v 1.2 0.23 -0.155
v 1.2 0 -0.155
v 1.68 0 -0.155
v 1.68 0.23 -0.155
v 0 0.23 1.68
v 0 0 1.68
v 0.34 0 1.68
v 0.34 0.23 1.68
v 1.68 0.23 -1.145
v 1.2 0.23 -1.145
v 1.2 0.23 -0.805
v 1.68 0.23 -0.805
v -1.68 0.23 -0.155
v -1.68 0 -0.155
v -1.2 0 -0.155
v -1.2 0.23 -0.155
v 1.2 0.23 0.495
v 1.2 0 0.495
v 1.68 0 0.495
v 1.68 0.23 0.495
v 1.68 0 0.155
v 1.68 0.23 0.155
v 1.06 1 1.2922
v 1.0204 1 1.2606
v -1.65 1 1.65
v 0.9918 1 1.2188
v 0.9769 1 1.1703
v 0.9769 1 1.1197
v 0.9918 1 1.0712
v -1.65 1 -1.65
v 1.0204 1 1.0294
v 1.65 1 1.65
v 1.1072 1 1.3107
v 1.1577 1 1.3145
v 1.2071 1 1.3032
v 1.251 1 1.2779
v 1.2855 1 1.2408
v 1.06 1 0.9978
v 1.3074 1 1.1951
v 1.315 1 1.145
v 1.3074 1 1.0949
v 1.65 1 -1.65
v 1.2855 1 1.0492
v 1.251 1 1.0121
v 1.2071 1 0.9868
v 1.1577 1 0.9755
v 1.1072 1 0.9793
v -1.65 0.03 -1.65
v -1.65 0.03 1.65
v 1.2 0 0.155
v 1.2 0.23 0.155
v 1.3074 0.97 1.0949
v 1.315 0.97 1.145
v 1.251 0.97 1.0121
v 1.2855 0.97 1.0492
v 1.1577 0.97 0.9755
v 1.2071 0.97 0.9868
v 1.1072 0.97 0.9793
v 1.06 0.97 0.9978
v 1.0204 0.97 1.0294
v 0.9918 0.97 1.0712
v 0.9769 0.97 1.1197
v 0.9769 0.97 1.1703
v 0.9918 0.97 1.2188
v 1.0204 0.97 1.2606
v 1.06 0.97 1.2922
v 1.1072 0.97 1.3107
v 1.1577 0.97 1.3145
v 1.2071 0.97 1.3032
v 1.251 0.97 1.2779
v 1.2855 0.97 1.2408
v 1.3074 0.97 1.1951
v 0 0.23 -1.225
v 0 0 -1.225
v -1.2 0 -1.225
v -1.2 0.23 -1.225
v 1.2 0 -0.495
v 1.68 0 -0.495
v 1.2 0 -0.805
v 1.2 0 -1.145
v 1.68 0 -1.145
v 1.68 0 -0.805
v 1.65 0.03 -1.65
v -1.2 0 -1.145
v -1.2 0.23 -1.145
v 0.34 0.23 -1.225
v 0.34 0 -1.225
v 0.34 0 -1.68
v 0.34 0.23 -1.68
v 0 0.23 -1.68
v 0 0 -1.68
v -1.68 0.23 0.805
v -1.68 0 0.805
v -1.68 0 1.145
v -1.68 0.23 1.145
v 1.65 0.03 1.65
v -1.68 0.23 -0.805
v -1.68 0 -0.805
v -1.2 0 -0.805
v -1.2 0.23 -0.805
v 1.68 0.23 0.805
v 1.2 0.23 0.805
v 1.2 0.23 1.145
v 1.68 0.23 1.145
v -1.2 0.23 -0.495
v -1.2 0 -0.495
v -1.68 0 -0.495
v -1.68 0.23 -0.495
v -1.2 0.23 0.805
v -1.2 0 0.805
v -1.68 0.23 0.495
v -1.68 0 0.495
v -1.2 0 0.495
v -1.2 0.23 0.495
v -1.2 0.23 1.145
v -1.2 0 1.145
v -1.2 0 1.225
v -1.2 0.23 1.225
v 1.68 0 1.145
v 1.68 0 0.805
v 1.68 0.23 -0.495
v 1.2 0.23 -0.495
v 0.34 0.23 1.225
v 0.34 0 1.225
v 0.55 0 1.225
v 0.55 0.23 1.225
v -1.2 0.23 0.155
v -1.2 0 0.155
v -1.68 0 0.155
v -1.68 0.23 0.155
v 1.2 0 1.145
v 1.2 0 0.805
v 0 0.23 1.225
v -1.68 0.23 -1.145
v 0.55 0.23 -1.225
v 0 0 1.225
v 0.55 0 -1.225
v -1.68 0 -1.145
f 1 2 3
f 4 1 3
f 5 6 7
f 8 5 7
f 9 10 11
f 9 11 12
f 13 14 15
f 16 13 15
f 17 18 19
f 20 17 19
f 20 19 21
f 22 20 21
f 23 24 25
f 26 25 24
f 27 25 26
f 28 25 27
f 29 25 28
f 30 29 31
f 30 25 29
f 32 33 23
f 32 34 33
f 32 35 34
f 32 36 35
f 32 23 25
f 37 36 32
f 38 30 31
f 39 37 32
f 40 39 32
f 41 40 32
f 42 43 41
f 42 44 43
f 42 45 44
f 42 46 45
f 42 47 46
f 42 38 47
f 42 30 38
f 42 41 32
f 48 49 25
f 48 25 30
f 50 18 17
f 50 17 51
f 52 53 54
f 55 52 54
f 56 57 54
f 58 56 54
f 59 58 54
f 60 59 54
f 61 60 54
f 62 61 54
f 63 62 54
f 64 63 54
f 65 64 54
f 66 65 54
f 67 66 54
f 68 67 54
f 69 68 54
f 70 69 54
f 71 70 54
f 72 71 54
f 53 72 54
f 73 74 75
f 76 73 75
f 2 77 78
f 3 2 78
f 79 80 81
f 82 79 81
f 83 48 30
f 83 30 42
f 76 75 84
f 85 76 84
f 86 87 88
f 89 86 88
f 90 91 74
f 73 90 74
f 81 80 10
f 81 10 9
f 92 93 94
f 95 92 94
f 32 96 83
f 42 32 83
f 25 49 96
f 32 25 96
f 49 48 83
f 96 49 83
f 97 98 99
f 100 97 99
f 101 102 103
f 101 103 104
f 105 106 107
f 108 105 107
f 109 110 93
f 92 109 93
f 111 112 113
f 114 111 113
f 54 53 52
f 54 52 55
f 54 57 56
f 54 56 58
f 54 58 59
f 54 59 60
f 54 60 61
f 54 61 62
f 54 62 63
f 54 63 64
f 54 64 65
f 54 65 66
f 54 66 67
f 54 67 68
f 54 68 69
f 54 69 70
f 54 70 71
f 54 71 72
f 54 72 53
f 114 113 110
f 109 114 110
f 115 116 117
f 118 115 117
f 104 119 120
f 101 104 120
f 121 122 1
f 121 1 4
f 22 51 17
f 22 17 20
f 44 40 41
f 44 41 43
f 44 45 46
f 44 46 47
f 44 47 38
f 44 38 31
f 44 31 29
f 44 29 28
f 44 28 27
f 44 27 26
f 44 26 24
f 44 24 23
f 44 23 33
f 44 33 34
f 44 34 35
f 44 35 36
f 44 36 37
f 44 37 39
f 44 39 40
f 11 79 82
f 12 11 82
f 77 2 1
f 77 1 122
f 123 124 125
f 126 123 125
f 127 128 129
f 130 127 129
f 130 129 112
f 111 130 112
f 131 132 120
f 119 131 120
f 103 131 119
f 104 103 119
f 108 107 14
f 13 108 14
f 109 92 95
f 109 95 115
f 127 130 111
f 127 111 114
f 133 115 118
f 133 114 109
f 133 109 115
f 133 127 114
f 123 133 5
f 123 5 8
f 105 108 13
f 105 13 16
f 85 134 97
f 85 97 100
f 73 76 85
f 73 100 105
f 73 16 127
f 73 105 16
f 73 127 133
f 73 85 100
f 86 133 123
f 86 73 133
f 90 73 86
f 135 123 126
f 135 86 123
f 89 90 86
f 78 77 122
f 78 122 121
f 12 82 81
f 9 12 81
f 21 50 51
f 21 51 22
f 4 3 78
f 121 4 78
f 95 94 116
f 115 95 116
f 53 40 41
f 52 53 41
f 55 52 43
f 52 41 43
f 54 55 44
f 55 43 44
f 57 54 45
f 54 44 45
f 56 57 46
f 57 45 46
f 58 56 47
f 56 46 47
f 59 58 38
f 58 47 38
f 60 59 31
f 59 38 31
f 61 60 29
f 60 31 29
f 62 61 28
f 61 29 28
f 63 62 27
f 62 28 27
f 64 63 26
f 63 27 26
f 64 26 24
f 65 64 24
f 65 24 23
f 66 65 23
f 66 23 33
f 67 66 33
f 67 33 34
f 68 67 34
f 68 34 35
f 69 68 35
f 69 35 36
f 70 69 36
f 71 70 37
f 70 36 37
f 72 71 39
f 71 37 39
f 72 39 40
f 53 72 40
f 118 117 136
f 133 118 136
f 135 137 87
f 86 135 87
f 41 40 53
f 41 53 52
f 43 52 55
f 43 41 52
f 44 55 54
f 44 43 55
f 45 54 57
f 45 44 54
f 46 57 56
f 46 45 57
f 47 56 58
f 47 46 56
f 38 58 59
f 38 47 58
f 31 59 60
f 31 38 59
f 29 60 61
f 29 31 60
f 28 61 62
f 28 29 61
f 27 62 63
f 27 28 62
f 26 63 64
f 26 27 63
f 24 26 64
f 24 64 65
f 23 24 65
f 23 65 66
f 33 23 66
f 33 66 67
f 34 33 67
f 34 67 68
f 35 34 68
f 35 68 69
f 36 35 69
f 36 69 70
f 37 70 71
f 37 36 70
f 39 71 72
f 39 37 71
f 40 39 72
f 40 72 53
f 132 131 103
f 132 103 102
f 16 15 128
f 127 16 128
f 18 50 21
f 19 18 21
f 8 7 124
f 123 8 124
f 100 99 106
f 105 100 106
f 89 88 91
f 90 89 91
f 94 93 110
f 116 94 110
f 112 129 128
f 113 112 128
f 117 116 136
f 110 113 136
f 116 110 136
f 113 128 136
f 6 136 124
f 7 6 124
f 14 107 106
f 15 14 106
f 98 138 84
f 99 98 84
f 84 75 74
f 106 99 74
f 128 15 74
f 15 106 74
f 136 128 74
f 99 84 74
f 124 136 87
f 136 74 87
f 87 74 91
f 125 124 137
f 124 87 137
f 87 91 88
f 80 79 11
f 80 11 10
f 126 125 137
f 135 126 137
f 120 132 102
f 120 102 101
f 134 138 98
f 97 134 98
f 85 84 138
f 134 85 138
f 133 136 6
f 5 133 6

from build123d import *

# Parameters (mm, degrees)
EXTRUDE_START       = 0.03
SKETCH_1_W          = 3.3
SKETCH_1_H          = 3.3
EXTRUDE_1_DEPTH     = 0.97
SKETCH_2_W          = 0.48
SKETCH_2_H          = 0.34
EXTRUDE_2_DEPTH     = 0.23
EXTRUDE_2_2_DEPTH   = 0.23
EXTRUDE_2_3_DEPTH   = 0.23
EXTRUDE_2_4_DEPTH   = 0.23
EXTRUDE_3_DEPTH     = 0.23
CUT_EXTRUDE_START   = 1
SKETCH_4_R          = 0.17
CUT_EXTRUDE_1_DEPTH = 0.03
EXTRUDE_START_2     = 1
SKETCH_4_2_R        = 0.17
EXTRUDE_4_DEPTH     = 0.03


with BuildPart() as part:
    # Эскиз1 → Бобышка-Вытянуть1 (new body)
    with BuildSketch(Plane(origin=(0, 0, 0), x_dir=(1, 0, 0), z_dir=(0, 1, 0)).offset(EXTRUDE_START)):
        Rectangle(SKETCH_1_W, SKETCH_1_H)
    extrude(amount=EXTRUDE_1_DEPTH)

    # Эскиз4 → Вырез-Вытянуть1 (cut)
    with BuildSketch(Plane(origin=(0, 0, 0), x_dir=(1, 0, 0), z_dir=(0, 1, 0)).offset(CUT_EXTRUDE_START)):
        with Locations((1.145, -1.145)):
            Circle(SKETCH_4_R)
    extrude(amount=-CUT_EXTRUDE_1_DEPTH, mode=Mode.SUBTRACT)


with BuildPart() as body_2:
    # Эскиз2 → Бобышка-Вытянуть2 (new body)
    with BuildSketch(Plane(origin=(0, 0, 0), x_dir=(1, 0, 0), z_dir=(0, 1, 0))):
        with Locations((1.44, -0.975)):
            Rectangle(SKETCH_2_W, SKETCH_2_H)
    extrude(amount=EXTRUDE_2_DEPTH)


with BuildPart() as body_3:
    # Эскиз2 → Extrude 2 2 (new body)
    with BuildSketch(Plane(origin=(0, 0, 0), x_dir=(1, 0, 0), z_dir=(0, 1, 0))):
        with Locations((1.44, 0.325)):
            Rectangle(SKETCH_2_W, SKETCH_2_H)
    extrude(amount=EXTRUDE_2_2_DEPTH)


with BuildPart() as body_4:
    # Эскиз2 → Extrude 2 3 (new body)
    with BuildSketch(Plane(origin=(0, 0, 0), x_dir=(1, 0, 0), z_dir=(0, 1, 0))):
        with Locations((1.44, 0.975)):
            Rectangle(SKETCH_2_W, SKETCH_2_H)
    extrude(amount=EXTRUDE_2_3_DEPTH)


with BuildPart() as body_5:
    # Эскиз2 → Extrude 2 4 (new body)
    with BuildSketch(Plane(origin=(0, 0, 0), x_dir=(1, 0, 0), z_dir=(0, 1, 0))):
        with Locations((1.44, -0.325)):
            Rectangle(SKETCH_2_W, SKETCH_2_H)
    extrude(amount=EXTRUDE_2_4_DEPTH)


with BuildPart() as body_6:
    # Эскиз3 → Бобышка-Вытянуть3 (new body)
    with BuildSketch(Plane(origin=(0, 0, 0), x_dir=(1, 0, 0), z_dir=(0, 1, 0))):
        Polygon((-1.2, -1.145), (-1.2, -1.225), (0, -1.225), (0, -1.68), (0.34, -1.68), (0.34, -1.225), (0.55, -1.225), (0.55, 1.225), (0.34, 1.225), (0.34, 1.68), (0, 1.68), (0, 1.225), (-1.2, 1.225), (-1.2, 1.145), (-1.68, 1.145), (-1.68, 0.805), (-1.2, 0.805), (-1.2, 0.495), (-1.68, 0.495), (-1.68, 0.155), (-1.2, 0.155), (-1.2, -0.155), (-1.68, -0.155), (-1.68, -0.495), (-1.2, -0.495), (-1.2, -0.805), (-1.68, -0.805), (-1.68, -1.145), align=None)
    extrude(amount=EXTRUDE_3_DEPTH)


with BuildPart() as body_7:
    # Эскиз4<2> → Бобышка-Вытянуть4 (new body)
    with BuildSketch(Plane(origin=(0, 0, 0), x_dir=(1, 0, 0), z_dir=(0, 1, 0)).offset(EXTRUDE_START_2)):
        with Locations((1.145, -1.145)):
            Circle(SKETCH_4_2_R)
    extrude(amount=-EXTRUDE_4_DEPTH)


solid = Compound([part.part, body_2.part, body_3.part, body_4.part, body_5.part, body_6.part, body_7.part])
